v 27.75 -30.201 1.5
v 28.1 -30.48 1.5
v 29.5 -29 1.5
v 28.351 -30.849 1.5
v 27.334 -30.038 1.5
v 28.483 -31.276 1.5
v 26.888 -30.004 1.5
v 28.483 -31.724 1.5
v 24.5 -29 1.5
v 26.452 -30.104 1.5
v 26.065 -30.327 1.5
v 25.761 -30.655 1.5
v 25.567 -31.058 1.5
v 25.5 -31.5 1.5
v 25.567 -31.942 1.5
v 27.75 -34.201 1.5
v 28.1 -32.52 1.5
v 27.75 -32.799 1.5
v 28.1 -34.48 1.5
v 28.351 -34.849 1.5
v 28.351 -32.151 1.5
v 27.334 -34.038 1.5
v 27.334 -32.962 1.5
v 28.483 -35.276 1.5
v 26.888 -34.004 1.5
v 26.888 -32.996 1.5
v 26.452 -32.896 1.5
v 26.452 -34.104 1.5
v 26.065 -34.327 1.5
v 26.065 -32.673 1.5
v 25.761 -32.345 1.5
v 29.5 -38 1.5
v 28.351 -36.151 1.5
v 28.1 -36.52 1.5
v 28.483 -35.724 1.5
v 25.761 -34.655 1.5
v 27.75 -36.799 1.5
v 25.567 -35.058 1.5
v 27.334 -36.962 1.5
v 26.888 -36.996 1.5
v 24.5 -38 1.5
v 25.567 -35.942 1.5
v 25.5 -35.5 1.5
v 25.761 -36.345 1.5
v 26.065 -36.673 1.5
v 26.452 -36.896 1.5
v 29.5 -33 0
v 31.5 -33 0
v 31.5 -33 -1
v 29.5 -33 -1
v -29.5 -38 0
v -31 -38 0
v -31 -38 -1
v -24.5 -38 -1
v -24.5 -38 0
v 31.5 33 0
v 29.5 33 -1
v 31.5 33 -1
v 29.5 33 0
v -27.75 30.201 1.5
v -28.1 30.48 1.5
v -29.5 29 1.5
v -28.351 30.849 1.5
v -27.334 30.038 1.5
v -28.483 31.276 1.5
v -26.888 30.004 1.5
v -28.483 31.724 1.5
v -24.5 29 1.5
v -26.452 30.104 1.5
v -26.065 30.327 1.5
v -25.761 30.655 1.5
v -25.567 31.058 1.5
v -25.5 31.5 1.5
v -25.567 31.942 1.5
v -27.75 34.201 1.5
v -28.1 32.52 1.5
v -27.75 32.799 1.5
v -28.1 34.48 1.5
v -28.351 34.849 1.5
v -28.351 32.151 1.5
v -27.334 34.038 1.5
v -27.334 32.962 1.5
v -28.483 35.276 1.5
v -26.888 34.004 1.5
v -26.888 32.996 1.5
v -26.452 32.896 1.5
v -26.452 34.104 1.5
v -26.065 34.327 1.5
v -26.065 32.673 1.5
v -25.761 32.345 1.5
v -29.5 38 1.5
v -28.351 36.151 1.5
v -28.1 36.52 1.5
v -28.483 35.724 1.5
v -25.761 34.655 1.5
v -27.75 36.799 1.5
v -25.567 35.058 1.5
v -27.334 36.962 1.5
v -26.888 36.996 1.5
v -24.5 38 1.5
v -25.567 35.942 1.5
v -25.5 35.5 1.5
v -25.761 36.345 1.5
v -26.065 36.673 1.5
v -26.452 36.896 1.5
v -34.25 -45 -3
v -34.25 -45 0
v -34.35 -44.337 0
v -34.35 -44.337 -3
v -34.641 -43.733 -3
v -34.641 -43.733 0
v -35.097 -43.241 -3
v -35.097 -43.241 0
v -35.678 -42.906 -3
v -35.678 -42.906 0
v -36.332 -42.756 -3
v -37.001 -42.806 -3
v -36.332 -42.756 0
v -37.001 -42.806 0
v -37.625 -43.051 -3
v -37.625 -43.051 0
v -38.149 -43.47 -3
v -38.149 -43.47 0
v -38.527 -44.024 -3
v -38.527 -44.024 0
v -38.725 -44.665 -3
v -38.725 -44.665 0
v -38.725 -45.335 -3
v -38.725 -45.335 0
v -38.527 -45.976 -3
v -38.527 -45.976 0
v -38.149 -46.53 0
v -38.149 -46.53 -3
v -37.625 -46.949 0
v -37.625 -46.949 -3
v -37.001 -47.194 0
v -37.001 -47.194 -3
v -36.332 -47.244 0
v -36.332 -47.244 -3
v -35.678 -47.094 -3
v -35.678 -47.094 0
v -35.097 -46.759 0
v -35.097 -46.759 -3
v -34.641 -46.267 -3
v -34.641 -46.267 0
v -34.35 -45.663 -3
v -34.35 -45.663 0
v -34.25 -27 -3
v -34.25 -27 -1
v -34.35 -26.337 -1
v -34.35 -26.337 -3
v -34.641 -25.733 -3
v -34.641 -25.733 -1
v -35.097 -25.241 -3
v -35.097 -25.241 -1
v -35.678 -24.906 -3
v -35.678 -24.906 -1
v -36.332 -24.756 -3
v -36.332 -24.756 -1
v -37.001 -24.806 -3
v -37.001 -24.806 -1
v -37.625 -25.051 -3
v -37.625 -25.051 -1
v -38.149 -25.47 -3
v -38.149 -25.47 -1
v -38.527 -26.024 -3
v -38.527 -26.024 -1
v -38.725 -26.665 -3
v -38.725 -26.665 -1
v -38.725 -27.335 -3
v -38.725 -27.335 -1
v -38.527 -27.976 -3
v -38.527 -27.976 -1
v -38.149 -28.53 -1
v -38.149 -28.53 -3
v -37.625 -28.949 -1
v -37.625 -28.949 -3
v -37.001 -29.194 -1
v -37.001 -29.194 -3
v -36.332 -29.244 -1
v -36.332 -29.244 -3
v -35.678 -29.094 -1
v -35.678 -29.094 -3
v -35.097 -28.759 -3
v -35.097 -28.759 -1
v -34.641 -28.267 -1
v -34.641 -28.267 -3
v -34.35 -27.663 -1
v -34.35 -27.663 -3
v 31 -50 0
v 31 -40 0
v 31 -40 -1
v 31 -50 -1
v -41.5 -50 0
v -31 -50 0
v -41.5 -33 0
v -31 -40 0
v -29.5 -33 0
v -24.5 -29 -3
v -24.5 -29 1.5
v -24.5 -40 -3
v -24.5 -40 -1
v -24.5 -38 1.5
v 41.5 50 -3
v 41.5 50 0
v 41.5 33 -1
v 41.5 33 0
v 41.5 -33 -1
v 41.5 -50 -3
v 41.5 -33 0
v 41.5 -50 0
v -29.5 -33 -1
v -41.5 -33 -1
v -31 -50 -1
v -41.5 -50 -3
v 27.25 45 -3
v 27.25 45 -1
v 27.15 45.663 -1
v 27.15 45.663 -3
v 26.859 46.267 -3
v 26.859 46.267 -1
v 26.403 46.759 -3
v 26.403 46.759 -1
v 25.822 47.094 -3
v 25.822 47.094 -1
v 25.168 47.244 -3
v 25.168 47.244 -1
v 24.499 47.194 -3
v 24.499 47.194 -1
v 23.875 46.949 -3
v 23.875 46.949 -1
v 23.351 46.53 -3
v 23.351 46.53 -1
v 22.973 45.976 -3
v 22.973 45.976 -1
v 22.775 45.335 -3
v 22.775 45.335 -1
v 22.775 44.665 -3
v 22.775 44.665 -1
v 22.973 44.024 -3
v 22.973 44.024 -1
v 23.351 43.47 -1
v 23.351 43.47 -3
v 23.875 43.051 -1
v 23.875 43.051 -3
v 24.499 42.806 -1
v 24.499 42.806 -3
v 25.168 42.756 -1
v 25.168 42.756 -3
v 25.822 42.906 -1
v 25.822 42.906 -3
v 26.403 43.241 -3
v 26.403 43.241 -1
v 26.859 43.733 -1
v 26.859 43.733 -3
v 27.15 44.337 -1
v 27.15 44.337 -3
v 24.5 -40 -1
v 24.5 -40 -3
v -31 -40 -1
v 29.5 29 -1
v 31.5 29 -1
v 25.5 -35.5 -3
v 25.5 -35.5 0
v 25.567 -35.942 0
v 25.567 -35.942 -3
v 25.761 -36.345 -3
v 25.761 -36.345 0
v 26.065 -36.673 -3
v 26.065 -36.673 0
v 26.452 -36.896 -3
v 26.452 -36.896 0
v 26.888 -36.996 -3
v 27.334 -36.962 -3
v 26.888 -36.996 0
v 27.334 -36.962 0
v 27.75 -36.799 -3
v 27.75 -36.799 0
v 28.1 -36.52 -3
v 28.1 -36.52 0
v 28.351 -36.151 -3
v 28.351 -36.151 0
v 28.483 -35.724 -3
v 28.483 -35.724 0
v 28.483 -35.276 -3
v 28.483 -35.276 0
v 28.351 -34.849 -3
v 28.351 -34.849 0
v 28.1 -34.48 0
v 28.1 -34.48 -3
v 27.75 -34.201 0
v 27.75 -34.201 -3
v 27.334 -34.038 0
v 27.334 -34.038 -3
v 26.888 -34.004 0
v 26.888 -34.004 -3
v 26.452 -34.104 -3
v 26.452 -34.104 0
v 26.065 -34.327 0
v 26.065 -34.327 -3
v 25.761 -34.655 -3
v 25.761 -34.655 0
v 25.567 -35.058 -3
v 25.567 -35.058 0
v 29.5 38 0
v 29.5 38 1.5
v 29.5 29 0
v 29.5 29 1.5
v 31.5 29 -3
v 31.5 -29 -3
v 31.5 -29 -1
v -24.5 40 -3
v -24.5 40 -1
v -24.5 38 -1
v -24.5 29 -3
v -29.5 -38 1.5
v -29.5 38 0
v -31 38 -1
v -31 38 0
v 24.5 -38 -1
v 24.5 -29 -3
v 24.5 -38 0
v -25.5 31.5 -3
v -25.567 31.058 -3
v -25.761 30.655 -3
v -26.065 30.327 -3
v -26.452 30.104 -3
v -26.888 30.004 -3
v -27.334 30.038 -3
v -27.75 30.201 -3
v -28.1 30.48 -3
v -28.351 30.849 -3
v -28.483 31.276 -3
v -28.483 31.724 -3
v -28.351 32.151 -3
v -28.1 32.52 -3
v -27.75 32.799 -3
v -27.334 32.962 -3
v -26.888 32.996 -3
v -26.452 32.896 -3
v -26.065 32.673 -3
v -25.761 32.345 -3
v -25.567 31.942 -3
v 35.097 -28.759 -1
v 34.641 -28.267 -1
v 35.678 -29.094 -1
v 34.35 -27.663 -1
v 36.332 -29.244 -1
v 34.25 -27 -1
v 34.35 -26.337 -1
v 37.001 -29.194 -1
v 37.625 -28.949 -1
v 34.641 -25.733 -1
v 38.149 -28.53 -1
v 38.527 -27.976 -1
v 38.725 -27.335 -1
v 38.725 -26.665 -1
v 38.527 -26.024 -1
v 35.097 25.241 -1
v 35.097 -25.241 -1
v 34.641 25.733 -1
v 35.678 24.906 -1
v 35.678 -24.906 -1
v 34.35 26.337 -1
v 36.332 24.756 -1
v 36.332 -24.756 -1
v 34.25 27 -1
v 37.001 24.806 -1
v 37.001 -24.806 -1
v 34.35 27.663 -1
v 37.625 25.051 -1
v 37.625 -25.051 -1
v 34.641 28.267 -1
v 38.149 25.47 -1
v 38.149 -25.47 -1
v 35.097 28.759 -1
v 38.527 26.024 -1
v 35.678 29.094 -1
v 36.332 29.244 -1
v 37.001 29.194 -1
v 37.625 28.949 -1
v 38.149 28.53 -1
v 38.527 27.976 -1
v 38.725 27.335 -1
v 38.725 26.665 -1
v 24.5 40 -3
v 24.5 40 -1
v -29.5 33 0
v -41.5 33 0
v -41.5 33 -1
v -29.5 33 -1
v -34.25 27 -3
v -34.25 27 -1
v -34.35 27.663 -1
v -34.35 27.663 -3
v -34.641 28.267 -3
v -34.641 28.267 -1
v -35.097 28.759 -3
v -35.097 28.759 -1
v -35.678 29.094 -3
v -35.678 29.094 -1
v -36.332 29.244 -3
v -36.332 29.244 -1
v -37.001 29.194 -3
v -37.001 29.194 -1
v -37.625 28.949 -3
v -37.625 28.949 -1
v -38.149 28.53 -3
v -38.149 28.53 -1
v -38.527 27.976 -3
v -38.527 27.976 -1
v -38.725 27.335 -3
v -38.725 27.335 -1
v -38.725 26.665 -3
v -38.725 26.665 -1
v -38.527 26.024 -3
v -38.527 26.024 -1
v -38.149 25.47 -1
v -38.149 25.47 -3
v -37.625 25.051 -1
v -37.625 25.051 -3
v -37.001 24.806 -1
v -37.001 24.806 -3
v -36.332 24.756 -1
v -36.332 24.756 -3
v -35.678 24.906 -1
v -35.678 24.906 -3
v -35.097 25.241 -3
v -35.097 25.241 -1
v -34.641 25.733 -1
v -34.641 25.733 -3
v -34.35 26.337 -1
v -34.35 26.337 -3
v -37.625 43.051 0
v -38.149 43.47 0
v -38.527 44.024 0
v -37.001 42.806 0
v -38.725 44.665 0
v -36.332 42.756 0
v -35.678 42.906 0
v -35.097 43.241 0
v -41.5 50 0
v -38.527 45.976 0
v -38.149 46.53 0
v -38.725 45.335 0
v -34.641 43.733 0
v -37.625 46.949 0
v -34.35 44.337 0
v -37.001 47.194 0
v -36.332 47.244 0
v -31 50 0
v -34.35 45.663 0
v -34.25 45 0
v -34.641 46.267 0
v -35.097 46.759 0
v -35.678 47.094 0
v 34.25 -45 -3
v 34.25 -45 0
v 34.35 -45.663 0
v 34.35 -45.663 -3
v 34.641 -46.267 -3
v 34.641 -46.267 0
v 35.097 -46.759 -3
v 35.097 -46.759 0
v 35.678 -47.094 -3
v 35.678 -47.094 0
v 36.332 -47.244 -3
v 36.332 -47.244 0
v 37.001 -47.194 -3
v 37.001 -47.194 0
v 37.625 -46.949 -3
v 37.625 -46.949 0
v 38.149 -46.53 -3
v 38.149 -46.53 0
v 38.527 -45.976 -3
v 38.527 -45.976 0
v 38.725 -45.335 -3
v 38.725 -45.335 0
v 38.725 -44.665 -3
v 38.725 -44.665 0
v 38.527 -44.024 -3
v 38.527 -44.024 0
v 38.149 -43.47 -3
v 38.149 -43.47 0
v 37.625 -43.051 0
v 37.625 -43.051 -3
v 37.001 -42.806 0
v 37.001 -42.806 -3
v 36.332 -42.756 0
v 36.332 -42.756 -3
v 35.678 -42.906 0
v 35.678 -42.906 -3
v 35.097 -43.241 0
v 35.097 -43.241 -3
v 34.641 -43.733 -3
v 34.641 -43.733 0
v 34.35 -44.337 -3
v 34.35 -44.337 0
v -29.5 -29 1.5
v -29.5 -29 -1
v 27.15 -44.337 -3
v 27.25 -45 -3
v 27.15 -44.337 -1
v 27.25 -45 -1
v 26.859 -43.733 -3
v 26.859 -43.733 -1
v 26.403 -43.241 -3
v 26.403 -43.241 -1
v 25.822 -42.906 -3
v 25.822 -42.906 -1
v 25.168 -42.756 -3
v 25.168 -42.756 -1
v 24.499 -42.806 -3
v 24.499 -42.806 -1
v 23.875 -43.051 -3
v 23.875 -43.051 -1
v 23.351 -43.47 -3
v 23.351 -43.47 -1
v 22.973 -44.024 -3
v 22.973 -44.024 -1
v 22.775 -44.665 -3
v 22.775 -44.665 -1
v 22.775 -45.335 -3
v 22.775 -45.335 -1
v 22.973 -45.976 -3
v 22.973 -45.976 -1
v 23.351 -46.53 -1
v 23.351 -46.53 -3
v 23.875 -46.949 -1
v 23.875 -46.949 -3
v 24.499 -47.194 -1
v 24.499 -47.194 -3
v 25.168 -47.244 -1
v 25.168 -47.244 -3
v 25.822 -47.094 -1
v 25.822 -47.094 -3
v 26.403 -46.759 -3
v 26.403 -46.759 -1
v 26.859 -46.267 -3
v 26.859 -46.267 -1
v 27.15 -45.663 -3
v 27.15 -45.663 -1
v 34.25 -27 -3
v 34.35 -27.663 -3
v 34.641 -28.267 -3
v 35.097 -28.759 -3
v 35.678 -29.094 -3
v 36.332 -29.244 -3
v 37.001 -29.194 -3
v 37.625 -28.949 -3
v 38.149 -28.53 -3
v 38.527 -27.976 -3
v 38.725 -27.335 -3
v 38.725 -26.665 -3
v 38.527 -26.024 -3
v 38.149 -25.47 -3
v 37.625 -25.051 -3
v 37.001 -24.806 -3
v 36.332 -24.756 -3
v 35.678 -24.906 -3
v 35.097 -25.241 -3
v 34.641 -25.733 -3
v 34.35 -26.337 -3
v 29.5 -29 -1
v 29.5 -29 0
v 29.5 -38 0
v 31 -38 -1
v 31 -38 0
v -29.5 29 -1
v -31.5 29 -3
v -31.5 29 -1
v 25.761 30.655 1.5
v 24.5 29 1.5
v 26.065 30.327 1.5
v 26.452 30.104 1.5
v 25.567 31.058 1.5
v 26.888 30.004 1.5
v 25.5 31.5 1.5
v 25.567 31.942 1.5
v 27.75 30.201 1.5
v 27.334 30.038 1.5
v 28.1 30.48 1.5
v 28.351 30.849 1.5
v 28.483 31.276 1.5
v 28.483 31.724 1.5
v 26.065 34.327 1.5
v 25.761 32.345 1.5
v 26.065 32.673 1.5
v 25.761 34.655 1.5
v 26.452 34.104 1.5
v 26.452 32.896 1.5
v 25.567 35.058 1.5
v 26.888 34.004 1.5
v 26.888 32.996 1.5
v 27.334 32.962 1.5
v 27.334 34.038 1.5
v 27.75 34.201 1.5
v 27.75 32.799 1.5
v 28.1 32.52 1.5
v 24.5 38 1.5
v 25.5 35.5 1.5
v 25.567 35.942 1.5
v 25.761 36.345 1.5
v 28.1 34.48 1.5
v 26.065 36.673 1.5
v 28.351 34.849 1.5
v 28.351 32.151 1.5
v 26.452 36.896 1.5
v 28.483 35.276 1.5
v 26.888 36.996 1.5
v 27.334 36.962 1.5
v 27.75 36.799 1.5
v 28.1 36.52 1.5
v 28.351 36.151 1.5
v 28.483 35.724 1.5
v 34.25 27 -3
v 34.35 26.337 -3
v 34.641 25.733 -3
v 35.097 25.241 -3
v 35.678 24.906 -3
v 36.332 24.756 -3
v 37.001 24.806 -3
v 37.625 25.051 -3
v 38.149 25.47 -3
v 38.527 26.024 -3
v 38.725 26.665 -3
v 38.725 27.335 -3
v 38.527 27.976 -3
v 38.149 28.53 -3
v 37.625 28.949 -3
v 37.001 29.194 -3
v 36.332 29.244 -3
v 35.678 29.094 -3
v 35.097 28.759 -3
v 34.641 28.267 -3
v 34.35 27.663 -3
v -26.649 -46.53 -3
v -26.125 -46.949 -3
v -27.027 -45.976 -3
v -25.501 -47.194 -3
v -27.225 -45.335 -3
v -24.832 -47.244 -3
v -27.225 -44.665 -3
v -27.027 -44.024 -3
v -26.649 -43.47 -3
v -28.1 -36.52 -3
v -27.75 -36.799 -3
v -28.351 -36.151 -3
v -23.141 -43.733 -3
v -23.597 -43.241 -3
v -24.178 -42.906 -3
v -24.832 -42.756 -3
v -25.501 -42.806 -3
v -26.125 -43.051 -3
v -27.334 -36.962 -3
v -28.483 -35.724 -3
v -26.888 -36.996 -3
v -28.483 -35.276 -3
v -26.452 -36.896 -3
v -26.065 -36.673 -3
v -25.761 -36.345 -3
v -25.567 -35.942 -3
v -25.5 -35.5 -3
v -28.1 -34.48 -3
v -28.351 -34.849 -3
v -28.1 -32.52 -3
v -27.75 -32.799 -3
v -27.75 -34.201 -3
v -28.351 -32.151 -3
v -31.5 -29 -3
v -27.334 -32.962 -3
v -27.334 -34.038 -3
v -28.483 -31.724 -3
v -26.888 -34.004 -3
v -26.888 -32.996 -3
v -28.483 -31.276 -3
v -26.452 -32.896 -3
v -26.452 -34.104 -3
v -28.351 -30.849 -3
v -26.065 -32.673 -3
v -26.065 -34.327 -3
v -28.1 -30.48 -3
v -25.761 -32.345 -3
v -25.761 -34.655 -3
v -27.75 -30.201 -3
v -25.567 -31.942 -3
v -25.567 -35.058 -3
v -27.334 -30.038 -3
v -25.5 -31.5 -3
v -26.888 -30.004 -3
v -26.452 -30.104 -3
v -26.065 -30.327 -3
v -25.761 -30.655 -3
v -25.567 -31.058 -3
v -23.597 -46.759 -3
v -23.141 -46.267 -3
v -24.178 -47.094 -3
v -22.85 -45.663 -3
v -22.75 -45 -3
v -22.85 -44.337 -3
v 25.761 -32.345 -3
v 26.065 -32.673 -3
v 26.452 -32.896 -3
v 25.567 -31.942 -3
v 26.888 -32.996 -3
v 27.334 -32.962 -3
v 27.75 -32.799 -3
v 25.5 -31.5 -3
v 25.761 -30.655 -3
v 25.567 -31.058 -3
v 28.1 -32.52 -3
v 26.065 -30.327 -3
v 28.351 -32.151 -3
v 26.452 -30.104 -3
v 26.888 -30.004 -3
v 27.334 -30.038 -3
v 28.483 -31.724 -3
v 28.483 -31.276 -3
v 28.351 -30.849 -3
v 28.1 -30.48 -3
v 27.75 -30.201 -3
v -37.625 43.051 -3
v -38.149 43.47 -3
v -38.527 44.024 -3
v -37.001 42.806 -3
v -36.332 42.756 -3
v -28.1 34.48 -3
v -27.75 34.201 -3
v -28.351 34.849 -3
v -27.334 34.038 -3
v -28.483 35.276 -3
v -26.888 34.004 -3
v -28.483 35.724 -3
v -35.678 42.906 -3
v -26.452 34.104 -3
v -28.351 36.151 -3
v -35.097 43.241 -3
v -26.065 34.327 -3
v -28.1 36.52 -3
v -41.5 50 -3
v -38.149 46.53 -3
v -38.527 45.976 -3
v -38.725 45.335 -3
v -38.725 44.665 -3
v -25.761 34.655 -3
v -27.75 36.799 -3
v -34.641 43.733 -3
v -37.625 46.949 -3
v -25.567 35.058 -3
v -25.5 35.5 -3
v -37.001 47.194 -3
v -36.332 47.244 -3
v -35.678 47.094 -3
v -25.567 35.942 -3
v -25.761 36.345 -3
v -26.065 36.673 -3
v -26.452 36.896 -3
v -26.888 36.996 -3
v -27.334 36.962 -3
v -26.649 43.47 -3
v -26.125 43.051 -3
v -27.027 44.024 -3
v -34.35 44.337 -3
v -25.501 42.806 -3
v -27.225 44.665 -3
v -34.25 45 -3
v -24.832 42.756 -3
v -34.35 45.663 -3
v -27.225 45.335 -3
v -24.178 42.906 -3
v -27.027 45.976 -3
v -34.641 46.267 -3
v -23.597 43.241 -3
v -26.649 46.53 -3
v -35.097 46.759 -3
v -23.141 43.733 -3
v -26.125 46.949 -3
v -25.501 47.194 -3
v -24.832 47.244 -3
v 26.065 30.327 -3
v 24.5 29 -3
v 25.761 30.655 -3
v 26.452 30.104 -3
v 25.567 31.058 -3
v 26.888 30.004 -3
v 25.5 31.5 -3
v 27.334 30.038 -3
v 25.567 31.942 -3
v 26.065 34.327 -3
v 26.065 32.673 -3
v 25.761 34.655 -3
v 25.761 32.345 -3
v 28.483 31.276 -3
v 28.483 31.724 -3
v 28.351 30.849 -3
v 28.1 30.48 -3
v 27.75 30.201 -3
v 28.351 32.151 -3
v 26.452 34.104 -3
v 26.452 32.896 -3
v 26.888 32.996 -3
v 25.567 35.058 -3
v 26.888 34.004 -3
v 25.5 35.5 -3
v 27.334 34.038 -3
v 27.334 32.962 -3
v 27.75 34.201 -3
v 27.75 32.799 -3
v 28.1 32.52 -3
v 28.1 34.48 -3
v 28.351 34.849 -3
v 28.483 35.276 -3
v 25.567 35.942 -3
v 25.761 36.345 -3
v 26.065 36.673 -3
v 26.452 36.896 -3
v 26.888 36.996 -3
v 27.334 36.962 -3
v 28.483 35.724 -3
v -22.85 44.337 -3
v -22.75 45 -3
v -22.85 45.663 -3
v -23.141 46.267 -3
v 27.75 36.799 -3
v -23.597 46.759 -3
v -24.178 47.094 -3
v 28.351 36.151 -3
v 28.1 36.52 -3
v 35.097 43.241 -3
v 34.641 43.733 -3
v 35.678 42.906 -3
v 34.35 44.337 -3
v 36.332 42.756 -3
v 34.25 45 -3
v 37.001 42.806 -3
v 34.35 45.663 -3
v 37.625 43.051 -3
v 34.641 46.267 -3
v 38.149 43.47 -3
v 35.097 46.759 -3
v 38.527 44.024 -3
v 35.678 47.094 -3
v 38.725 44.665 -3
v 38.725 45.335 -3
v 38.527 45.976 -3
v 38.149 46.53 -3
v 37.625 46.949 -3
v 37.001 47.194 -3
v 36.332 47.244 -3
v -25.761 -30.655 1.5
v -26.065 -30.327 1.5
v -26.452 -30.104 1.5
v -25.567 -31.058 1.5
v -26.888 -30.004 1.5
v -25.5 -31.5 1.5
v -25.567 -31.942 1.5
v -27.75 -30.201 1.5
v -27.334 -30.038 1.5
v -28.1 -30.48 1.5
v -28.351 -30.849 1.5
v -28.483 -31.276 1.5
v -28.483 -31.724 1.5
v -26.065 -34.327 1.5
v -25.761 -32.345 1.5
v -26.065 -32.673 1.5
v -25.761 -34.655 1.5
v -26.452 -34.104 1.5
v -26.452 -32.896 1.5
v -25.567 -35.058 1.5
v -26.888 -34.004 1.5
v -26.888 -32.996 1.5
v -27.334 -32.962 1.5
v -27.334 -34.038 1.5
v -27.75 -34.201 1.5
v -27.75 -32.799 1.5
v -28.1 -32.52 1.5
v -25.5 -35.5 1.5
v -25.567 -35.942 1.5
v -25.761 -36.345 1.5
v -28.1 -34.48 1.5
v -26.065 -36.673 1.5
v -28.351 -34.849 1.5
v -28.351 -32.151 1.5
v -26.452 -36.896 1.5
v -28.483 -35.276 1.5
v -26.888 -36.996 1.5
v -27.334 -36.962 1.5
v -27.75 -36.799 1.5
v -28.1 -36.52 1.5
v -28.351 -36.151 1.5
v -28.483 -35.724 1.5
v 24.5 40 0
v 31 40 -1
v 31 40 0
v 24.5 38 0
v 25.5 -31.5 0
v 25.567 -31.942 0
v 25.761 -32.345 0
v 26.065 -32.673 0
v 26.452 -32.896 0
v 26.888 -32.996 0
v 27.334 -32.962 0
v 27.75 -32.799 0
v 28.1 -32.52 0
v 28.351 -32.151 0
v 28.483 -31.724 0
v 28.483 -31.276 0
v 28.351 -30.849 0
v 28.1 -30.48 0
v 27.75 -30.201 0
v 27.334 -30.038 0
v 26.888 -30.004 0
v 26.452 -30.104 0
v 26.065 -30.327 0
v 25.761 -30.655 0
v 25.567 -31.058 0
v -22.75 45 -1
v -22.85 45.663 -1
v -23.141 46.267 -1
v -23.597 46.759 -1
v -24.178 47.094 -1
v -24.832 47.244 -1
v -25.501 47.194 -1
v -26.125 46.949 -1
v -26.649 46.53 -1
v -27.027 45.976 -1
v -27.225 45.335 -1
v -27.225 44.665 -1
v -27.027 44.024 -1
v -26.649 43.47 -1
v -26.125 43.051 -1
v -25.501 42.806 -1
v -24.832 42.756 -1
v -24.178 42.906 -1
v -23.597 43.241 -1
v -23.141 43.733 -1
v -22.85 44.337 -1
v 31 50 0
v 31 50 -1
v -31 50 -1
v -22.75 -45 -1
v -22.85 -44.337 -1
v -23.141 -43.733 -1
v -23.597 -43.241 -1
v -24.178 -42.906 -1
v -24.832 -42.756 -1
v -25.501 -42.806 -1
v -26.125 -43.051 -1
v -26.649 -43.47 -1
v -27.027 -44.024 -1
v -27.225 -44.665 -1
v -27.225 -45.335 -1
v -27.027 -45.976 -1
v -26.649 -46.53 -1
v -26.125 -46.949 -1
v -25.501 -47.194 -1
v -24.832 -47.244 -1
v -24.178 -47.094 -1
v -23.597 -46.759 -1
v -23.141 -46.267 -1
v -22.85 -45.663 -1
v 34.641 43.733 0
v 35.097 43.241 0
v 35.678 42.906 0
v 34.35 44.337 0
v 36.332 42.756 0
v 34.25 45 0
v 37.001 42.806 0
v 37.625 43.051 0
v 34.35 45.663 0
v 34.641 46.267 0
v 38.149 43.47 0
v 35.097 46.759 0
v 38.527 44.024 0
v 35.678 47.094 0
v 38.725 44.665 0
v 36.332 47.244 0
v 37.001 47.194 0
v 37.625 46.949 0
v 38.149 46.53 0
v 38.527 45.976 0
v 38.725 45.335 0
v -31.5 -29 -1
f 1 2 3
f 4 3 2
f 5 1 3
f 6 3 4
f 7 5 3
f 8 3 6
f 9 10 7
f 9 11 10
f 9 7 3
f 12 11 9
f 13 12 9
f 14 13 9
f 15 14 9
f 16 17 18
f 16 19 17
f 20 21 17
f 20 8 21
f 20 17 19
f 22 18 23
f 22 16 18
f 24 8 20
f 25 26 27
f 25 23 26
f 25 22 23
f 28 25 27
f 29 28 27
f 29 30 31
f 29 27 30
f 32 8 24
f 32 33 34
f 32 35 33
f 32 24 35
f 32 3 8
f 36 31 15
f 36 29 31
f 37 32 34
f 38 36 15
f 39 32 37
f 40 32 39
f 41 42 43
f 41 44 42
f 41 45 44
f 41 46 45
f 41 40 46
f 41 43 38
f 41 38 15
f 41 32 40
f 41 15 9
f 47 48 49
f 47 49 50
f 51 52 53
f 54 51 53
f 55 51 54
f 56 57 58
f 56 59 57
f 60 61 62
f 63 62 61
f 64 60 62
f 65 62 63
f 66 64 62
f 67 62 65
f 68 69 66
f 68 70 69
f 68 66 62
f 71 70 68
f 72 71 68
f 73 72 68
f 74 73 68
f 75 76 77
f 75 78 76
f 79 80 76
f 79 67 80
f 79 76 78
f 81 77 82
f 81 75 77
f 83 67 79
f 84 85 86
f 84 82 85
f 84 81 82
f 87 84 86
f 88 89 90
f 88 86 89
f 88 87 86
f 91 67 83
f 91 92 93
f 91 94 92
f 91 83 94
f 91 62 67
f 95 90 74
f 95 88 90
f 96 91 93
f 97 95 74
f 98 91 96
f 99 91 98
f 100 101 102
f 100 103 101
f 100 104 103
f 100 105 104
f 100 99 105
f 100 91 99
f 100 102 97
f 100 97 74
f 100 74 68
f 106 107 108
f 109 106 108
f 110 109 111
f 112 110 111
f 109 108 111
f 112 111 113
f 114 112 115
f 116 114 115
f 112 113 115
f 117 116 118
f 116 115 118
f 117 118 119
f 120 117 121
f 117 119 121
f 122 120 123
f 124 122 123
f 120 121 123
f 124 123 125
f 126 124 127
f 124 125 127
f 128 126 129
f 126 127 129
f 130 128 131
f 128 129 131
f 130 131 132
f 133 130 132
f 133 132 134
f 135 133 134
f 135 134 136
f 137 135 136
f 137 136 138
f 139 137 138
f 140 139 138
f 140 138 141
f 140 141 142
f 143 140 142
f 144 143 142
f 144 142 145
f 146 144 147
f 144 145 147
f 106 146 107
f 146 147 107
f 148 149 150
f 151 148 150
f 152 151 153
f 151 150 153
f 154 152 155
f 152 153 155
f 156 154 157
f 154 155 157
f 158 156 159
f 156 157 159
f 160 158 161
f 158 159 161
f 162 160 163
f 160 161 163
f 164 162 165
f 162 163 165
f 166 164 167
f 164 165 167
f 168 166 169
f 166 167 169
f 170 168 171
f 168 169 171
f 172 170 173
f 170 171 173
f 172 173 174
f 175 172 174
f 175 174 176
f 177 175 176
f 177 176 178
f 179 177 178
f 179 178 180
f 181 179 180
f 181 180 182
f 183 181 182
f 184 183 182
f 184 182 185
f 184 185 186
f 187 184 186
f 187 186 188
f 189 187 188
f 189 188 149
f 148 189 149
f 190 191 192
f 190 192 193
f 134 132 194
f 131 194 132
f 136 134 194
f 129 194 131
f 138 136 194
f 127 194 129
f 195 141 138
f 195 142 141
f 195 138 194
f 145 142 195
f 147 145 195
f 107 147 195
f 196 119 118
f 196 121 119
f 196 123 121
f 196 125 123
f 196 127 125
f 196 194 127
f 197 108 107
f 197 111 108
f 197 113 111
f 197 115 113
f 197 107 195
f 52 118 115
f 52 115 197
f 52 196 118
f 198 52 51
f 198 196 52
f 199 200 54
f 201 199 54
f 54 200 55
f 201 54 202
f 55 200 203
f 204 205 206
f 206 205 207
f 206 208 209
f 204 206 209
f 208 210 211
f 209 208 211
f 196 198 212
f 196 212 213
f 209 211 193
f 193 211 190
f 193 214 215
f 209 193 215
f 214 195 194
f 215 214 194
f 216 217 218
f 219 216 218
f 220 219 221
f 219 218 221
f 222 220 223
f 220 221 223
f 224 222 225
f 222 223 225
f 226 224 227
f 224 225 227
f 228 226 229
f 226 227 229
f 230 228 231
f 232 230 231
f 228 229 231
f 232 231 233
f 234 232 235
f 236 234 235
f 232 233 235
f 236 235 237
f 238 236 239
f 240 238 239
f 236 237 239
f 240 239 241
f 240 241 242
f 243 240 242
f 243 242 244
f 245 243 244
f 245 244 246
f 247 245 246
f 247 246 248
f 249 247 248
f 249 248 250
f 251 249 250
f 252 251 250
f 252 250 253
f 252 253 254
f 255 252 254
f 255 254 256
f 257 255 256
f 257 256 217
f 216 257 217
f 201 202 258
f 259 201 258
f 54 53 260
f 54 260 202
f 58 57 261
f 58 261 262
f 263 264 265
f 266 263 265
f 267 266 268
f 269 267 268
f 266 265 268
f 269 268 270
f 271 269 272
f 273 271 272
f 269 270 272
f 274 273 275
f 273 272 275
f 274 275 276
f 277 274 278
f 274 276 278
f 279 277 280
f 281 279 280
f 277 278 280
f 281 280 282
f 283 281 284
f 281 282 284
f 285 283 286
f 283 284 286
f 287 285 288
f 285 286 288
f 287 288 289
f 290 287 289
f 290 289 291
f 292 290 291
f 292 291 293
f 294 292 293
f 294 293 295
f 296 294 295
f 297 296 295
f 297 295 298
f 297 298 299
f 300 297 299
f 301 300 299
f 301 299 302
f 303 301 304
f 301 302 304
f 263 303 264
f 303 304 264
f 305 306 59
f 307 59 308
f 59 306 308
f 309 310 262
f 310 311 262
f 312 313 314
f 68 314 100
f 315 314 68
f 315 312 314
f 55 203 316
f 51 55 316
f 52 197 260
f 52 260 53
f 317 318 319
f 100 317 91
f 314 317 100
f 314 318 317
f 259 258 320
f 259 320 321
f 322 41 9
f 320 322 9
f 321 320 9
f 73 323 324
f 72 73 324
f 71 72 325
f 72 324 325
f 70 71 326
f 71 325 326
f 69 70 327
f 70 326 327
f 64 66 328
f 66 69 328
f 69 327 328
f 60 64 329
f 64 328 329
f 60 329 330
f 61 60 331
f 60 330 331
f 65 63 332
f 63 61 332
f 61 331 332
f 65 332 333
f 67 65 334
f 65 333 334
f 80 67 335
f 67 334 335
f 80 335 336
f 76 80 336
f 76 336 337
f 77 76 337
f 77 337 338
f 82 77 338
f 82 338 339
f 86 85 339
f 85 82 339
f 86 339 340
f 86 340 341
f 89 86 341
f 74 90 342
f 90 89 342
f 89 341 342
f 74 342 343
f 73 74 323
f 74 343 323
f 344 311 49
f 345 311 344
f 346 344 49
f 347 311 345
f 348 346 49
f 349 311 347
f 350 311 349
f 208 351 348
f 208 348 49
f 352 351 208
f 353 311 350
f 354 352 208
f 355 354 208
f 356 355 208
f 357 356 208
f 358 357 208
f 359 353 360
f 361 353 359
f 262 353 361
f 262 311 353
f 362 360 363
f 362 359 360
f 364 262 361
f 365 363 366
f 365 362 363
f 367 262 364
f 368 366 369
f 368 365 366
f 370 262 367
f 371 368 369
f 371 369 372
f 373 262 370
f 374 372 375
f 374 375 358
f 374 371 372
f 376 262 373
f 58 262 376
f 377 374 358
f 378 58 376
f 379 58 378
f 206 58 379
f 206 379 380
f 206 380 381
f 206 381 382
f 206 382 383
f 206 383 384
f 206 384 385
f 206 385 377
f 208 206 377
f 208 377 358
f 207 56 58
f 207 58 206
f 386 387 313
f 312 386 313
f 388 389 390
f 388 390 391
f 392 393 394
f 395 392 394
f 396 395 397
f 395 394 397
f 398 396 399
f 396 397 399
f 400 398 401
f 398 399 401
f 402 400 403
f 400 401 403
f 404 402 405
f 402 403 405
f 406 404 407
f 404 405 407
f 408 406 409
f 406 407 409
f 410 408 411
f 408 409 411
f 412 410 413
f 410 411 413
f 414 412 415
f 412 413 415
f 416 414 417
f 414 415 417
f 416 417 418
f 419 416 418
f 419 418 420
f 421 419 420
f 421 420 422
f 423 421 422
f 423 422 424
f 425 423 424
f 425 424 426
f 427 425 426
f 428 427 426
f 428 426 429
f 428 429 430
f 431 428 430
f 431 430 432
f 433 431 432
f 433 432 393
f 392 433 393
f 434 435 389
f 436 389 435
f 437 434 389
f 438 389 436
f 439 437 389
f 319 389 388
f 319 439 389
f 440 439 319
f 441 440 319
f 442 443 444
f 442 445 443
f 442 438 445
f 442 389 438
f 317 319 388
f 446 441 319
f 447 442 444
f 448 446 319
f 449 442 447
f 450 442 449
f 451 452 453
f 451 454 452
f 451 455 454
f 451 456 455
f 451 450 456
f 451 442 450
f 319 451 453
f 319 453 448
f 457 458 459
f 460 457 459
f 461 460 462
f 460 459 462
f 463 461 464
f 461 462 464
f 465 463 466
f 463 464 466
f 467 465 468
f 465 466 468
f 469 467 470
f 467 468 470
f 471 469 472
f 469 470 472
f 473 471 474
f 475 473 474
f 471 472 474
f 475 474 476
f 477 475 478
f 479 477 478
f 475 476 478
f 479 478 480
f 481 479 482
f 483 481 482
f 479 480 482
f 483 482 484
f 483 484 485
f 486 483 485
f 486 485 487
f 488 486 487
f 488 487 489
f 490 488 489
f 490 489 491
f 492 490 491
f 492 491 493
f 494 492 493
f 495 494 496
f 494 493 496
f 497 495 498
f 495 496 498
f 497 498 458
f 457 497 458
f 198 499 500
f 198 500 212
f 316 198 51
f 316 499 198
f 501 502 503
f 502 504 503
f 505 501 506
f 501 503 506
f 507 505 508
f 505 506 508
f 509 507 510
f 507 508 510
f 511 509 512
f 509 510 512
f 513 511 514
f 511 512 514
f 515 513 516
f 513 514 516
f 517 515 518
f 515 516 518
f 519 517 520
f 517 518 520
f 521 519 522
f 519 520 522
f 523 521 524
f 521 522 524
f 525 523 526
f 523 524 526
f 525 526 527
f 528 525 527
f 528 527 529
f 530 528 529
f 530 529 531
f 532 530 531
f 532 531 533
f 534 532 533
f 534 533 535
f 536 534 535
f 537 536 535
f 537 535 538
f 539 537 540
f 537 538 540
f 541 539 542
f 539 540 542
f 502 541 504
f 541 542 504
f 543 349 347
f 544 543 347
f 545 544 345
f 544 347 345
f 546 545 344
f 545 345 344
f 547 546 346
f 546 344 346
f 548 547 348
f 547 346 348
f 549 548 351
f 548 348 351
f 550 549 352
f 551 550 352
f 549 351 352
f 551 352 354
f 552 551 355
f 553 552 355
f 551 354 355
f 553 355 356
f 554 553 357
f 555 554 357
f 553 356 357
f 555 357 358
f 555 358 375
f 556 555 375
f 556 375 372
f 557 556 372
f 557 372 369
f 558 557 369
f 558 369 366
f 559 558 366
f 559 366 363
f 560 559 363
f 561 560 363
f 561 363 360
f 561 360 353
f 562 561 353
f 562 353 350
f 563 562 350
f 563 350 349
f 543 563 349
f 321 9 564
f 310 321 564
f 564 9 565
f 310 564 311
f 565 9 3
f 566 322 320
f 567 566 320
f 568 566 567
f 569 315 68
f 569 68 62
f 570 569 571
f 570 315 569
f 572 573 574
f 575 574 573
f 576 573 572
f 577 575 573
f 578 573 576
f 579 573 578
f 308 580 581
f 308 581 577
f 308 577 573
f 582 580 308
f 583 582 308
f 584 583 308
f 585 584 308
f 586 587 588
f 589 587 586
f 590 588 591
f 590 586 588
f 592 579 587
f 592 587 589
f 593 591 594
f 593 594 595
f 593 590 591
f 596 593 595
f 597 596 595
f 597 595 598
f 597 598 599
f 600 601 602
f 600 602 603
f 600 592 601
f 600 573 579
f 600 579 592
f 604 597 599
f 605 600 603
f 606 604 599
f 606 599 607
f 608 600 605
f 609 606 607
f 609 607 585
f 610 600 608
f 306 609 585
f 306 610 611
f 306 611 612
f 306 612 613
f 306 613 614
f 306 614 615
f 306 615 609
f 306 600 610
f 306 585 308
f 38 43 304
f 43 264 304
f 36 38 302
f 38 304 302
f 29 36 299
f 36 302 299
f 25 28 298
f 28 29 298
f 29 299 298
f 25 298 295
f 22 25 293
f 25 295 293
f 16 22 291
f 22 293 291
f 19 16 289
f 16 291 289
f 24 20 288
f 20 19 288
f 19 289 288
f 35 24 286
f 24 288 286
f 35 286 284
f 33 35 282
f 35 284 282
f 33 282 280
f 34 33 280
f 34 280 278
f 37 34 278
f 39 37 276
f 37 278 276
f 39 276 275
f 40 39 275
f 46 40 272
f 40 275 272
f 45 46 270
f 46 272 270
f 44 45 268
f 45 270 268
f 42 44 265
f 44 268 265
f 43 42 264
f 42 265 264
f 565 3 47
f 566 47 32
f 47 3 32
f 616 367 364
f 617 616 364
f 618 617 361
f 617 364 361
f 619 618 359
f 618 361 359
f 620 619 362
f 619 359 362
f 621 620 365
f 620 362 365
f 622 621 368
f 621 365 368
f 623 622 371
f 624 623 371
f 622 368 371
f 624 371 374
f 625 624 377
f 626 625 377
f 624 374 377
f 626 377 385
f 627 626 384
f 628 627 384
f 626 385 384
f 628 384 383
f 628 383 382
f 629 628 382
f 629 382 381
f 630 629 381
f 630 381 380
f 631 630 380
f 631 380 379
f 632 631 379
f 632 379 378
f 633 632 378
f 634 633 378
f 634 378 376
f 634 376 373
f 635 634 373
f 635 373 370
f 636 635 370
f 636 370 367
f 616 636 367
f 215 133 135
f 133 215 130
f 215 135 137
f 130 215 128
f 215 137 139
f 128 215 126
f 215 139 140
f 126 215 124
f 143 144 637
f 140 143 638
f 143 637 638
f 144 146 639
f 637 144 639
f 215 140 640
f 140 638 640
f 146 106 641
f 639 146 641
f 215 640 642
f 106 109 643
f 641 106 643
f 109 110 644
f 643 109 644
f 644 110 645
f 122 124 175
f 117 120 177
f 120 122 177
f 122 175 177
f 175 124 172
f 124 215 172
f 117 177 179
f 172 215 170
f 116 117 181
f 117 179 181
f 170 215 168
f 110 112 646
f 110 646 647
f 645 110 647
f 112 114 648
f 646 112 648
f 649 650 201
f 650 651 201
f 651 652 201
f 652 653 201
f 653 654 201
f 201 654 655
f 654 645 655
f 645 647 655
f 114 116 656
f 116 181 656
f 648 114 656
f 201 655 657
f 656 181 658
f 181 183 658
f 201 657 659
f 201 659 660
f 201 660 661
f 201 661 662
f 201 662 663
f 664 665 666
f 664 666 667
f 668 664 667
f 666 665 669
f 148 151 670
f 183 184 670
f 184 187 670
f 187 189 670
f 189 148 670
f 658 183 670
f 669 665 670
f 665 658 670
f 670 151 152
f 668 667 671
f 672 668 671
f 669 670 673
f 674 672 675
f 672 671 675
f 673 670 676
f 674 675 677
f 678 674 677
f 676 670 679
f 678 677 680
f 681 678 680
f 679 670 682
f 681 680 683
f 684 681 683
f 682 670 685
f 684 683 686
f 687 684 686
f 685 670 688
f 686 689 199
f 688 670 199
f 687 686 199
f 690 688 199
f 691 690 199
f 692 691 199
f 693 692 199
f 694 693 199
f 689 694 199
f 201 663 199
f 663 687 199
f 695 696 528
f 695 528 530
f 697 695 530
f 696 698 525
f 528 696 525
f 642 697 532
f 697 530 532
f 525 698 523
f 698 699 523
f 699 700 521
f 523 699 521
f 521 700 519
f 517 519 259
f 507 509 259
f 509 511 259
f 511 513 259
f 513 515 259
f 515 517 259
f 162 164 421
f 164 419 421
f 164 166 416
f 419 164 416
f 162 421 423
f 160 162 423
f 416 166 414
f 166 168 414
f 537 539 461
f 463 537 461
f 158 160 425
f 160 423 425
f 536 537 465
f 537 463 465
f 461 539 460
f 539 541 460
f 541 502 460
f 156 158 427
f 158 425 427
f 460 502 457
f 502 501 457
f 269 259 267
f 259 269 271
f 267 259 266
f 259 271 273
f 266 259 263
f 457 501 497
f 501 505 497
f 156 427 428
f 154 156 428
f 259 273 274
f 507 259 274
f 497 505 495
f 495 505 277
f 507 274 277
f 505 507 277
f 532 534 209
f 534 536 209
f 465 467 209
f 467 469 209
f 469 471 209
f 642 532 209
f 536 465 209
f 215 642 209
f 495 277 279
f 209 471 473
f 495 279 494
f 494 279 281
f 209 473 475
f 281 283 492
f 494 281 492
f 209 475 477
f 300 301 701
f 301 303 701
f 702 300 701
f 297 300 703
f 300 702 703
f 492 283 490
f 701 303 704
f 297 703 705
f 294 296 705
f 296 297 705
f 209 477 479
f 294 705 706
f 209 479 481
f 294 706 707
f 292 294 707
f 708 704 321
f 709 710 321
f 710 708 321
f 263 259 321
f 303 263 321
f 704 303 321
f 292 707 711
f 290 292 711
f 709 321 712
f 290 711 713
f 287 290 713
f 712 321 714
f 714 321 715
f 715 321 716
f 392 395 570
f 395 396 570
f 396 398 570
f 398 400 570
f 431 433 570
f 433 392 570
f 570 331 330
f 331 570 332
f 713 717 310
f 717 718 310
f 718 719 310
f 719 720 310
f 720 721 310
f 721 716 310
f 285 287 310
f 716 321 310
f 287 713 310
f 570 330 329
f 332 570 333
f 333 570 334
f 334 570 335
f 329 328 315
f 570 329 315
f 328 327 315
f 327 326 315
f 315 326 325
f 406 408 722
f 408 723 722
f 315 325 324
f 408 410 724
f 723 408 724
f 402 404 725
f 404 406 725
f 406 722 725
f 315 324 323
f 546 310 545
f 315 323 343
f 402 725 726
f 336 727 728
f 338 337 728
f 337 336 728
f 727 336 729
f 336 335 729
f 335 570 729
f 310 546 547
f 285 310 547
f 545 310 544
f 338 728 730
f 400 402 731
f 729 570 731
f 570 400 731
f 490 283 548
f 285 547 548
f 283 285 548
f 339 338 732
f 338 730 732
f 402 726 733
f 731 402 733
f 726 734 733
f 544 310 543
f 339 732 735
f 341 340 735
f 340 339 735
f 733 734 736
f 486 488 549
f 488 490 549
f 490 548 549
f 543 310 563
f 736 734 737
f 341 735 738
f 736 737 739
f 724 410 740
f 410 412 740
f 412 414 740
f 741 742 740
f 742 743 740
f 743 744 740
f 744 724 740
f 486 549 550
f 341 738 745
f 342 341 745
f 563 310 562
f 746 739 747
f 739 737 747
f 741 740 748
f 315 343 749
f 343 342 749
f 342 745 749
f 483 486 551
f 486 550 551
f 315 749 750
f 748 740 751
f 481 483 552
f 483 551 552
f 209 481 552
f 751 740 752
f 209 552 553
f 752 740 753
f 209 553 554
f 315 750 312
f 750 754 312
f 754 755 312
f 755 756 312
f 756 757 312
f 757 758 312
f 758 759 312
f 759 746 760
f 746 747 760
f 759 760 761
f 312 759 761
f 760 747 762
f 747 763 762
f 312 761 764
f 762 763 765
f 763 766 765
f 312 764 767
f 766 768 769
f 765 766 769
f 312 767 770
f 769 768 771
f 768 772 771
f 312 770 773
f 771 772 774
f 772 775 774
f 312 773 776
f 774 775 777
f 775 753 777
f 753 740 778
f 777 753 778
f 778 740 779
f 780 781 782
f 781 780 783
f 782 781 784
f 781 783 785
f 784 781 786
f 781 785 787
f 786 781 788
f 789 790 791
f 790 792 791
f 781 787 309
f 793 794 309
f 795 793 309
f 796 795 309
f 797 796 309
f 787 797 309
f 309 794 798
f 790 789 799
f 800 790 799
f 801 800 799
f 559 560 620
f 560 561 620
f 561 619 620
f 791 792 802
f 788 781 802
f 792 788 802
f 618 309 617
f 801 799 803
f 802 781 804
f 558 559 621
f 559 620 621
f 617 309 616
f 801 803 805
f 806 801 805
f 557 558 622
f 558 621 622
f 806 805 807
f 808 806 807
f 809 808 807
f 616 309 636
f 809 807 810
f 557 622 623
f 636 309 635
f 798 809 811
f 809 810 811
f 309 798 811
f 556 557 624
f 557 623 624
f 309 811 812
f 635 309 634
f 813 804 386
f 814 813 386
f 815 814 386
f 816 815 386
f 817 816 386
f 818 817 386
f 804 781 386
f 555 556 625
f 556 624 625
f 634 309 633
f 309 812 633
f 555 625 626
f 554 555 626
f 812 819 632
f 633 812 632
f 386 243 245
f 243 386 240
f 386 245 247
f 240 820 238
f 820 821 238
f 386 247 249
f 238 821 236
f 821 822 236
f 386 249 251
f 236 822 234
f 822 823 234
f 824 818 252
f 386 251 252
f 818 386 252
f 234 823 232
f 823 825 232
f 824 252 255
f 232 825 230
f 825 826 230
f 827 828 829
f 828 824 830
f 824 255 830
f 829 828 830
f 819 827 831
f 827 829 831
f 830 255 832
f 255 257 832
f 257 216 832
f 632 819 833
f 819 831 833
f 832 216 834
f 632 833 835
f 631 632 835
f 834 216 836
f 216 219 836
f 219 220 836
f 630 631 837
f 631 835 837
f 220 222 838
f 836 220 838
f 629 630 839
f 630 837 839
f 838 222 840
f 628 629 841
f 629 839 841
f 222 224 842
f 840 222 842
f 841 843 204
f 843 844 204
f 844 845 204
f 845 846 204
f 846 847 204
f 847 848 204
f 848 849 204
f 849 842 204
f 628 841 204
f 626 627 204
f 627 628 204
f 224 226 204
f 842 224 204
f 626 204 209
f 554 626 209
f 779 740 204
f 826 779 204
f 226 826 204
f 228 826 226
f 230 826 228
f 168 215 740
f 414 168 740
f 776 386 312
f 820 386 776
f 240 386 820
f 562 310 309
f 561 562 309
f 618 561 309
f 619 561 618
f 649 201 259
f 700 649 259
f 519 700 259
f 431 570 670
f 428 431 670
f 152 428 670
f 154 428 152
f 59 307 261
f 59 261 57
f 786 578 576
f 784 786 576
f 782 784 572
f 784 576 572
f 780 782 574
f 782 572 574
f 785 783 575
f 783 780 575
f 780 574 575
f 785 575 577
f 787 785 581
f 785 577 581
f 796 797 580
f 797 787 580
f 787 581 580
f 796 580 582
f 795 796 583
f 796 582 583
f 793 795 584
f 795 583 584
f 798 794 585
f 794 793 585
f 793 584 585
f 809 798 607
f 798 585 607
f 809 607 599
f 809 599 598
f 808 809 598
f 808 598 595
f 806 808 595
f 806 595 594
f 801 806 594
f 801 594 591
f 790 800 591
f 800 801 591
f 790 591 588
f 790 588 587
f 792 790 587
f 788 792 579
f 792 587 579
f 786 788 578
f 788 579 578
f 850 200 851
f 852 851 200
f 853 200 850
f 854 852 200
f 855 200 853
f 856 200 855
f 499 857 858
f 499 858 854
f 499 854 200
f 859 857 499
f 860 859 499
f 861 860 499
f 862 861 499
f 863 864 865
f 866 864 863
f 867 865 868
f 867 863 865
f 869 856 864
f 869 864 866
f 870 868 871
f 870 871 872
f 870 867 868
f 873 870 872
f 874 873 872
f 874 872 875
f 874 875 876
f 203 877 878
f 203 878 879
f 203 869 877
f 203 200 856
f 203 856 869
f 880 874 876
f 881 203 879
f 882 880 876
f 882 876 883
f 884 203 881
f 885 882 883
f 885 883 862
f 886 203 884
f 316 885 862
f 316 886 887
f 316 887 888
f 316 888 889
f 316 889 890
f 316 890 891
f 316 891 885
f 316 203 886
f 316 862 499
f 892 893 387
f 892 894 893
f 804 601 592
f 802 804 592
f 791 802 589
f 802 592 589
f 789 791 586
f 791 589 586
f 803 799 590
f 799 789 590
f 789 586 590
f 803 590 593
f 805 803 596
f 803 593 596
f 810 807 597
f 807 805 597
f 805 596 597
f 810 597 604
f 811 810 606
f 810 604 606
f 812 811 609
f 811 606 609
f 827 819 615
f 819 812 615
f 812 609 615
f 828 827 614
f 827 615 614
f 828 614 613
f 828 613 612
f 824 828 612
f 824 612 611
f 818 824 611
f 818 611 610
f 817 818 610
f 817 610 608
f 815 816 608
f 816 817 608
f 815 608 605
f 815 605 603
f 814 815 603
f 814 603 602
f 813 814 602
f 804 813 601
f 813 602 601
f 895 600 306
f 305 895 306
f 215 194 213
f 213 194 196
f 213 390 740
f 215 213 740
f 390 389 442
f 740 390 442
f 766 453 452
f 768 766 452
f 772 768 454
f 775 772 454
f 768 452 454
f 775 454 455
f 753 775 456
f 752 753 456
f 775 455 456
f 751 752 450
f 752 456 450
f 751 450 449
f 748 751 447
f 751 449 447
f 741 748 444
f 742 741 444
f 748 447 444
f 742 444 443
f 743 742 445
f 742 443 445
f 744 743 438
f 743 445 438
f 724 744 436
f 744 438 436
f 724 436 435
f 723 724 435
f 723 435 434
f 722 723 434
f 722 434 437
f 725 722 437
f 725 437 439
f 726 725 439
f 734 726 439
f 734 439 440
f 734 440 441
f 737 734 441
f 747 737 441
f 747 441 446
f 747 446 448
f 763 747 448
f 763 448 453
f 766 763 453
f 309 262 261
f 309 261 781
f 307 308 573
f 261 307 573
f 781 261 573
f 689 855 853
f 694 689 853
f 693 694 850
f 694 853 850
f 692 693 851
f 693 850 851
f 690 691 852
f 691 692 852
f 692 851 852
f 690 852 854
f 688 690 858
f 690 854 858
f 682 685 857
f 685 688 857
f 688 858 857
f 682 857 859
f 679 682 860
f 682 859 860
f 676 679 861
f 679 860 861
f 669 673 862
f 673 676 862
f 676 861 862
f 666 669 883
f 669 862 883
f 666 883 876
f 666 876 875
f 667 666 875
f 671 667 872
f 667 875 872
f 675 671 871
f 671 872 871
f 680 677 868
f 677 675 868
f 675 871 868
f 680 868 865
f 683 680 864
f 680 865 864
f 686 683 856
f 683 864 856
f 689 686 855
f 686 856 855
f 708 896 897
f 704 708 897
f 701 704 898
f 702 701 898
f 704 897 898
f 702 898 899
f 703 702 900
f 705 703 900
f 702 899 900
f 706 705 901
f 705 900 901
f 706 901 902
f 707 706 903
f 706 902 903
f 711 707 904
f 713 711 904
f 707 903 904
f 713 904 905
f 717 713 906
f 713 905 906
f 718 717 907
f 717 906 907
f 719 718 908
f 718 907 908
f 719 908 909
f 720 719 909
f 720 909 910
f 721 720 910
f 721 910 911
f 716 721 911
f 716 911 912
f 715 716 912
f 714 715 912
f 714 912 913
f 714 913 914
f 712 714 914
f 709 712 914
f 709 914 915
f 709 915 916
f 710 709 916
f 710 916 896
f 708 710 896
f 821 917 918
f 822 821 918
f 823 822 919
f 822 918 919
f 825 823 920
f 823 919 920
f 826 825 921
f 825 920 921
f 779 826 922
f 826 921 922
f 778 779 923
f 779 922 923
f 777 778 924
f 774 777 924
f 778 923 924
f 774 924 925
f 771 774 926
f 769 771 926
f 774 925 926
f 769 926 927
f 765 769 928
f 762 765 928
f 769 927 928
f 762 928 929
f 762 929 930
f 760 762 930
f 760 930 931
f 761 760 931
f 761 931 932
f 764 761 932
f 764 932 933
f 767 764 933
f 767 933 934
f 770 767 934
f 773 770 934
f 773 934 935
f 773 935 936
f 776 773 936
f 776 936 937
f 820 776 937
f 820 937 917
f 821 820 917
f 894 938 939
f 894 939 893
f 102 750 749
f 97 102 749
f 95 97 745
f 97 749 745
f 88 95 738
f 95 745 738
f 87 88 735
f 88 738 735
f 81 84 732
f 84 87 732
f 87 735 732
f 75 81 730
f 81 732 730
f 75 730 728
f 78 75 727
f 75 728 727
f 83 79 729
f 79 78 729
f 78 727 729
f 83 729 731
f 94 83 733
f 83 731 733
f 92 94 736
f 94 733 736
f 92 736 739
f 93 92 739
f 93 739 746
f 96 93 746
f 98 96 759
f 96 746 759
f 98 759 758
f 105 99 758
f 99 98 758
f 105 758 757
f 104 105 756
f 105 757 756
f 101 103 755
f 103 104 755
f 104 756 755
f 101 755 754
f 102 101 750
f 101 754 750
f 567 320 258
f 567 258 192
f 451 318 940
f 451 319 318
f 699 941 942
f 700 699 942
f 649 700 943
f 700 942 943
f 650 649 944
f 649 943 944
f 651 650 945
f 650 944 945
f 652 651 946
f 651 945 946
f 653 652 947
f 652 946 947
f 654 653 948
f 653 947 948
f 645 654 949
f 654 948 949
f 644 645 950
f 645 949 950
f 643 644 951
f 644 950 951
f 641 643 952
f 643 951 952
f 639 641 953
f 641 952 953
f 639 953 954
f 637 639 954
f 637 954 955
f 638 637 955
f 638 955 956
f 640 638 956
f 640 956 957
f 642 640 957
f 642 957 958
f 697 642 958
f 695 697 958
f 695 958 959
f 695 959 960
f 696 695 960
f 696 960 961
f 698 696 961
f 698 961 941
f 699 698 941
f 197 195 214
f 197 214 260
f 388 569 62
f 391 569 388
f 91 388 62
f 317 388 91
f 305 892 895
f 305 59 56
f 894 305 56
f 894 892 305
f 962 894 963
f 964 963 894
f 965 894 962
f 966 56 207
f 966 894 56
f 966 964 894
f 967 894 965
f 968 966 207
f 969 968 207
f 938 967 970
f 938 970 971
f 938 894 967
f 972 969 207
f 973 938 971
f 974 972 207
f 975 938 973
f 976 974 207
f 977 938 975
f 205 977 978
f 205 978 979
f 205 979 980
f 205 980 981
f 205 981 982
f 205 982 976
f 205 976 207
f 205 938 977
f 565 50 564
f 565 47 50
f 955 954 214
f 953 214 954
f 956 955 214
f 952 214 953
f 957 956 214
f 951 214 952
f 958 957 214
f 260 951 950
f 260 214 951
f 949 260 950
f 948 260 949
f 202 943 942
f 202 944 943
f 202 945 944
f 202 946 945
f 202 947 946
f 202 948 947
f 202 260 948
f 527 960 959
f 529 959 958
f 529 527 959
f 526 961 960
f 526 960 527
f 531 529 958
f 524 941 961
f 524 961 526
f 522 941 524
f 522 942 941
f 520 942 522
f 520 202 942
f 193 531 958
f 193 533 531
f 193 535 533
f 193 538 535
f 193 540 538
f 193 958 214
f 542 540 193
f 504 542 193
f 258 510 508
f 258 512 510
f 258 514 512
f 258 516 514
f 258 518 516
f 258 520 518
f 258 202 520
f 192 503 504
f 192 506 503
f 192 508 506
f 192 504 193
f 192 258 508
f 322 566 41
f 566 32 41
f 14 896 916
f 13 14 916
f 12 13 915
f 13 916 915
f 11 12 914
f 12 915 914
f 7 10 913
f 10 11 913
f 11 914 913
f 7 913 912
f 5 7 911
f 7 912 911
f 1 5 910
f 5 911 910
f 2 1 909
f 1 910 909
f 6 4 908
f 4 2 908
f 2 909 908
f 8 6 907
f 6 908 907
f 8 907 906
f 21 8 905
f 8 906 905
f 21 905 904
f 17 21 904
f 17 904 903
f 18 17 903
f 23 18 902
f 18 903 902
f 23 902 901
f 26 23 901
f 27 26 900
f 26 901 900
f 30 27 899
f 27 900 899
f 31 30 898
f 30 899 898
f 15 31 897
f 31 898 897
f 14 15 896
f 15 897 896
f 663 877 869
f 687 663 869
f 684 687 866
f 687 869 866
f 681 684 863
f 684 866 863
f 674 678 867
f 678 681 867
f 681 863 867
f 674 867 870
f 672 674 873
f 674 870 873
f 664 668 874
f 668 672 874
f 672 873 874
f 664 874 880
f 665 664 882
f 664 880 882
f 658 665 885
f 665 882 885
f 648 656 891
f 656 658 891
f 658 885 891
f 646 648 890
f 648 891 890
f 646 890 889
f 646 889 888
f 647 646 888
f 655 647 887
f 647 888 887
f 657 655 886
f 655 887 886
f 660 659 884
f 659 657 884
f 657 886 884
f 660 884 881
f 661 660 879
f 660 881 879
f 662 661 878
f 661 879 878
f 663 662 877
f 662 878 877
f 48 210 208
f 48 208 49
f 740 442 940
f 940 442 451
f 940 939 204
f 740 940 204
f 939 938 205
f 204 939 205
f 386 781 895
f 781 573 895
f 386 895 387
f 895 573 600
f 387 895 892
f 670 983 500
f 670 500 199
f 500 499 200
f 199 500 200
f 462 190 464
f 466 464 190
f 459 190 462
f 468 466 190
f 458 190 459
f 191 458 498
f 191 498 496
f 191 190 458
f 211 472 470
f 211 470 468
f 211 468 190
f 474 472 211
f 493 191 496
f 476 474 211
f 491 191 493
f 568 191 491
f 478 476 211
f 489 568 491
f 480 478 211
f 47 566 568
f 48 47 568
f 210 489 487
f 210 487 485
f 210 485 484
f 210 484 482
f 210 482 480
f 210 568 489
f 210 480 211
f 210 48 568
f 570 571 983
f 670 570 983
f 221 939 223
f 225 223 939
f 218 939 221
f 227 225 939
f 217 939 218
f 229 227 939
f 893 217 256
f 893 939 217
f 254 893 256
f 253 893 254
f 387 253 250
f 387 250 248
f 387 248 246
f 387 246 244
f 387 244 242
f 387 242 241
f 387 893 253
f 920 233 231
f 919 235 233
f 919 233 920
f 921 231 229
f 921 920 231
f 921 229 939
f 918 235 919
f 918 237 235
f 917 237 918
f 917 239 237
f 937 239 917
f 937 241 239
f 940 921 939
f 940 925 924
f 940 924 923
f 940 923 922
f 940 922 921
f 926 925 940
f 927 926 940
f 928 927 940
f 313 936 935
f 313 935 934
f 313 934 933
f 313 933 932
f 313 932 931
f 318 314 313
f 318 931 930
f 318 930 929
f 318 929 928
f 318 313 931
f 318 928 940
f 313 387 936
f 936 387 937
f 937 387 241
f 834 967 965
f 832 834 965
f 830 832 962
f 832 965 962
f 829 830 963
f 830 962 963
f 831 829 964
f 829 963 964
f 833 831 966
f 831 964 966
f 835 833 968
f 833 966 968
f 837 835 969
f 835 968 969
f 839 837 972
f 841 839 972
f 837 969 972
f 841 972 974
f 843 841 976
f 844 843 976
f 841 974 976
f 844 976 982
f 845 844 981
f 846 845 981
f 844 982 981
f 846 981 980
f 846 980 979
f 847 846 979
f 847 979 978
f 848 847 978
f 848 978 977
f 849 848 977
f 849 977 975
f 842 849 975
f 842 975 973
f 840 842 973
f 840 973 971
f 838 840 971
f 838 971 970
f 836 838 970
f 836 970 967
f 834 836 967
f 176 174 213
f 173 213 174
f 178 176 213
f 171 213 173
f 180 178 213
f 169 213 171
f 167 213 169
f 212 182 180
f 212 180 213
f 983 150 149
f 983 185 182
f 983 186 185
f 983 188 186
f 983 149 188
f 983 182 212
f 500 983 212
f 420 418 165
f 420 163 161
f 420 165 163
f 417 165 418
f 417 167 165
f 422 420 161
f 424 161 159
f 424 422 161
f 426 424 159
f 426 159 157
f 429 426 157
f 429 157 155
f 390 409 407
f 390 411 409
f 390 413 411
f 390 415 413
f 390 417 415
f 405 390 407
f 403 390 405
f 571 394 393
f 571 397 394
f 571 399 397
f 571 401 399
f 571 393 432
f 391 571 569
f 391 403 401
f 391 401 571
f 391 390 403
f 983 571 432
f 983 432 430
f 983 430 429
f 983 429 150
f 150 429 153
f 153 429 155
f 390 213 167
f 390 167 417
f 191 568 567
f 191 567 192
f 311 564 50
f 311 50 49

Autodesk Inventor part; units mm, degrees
ref_plane "YZ Plane" through (0, 0, 0) normal (1, 0, 0) x (0, 1, 0)
ref_plane "XZ Plane" through (0, 0, 0) normal (0, 1, 0) x (-1, 0, 0)
ref_plane "XY Plane" through (0, 0, 0) normal (0, 0, 1) x (1, 0, 0)
sketch "Block1" plane through (0, 0, 0) normal (0, 0, 1) x (1, 0, 0)
  circle A0 centre (-3.2722, 18.9) radius 2.25
  circle A1 centre (-12.45, 7.7) radius 2.25
  circle A2 centre (-12.45, -4.3) radius 2.25
  line L0 (-6.45, -9) -> (-15.45, -9)
  line L1 (-6.45, -9) -> (-6.45, 12.4)
  line L2 (-6.45, 12.4) -> (2.9056, 12.4)
  line L3 (2.9056, 23.9) -> (-15.45, 23.9)
  line L4 (-15.45, -9) -> (-15.45, 23.9)
  line L5 (2.9056, 12.4) -> (2.9056, 23.9)
  line L6 (-6.45, 1.7) -> (-15.45, 1.7) construction
  point P0 (-7.0963, 8.6833)
  dimension "d131" = 6
  dimension "d132" = 6
sketch "Sketch1" plane through (0, 0, 0) normal (0, 0, 1) x (1, 0, 0)
  line L0 (-41.5, 50) -> (41.5, 50)
  line L1 (41.5, 50) -> (41.5, -50)
  line L2 (41.5, -50) -> (-41.5, -50)
  line L3 (-41.5, -50) -> (-41.5, 50)
  line L4 (31.5, 40) -> (-31.5, 40)
  line L5 (-31.5, 40) -> (-31.5, -40)
  line L6 (-31.5, -40) -> (31.5, -40)
  line L7 (31.5, -40) -> (31.5, 40)
  line L8 (-41.5, -45) -> (41.5, -45) construction
  line L9 (0, 71.7466) -> (0, -78.0681) construction
  line L10 (-60.2597, 0) -> (74.2823, 0) construction
  line L11 (-36.5, 50) -> (-36.5, -50) construction
  circle A0 centre (-36.5, -27) radius 2.25
  line L12 (-41.5, 45) -> (41.5, 45) construction
  circle A1 centre (-36.5, 45) radius 2.25
  circle A2 centre (-36.5, -45) radius 2.25
  circle A3 centre (-36.5, 27) radius 2.25
  circle A4 centre (-25, -45) radius 2.25
  circle A5 centre (25, -45) radius 2.25
  line L13 (30, 50) -> (30, -50) construction
  line L14 (-30, 50) -> (-30, -50) construction
  line L15 (-31, -38) -> (31, -38)
  line L16 (31, -38) -> (31, -52)
  line L17 (31, -52) -> (-31, -52)
  line L18 (-31, -52) -> (-31, -38)
  line L19 (-43.5, 33) -> (-29.5, 33)
  line L20 (-29.5, 33) -> (-29.5, -33)
  line L21 (-29.5, -33) -> (-43.5, -33)
  line L22 (-43.5, -33) -> (-43.5, 33)
  line L23 (-31.5, 40) -> (-24.5, 40)
  line L24 (-24.5, 40) -> (-24.5, 29)
  line L25 (-24.5, 29) -> (-31.5, 29)
  line L26 (-31.5, 29) -> (-31.5, 40)
  line L27 (-24.5, 29) -> (-29.5, 29)
  line L28 (-29.5, 29) -> (-29.5, 38)
  line L29 (-29.5, 38) -> (-24.5, 38)
  line L30 (-24.5, 38) -> (-24.5, 29)
  circle A6 centre (-27, 35.5) radius 1.5
  circle A7 centre (-27, 31.5) radius 1.5
  line L31 (22.2, -40) -> (-10.7, -40)
  point P0 (0, 0)
  point P1 (0, 50)
  point P2 (41.5, 0)
  point P3 (0, 45)
  point P4 (-27, 38)
  point P5 (-27, 29)
  dimension "d0" = 83
  dimension "d1" = 100
  dimension "d5" = 5
  dimension "d6" = 5
  dimension "d9" = 5
  dimension "d12" = 4.5
  dimension "d17" = 5
  dimension "d41" = 4.5
  dimension "d42" = 4.5
  dimension "d87" = 4.5
  dimension "d89" = 4.5
  dimension "d90" = 4.5
  dimension "d91" = 30
  dimension "d92" = 30
  dimension "d93" = 5
  dimension "d94" = 5
  dimension "d97" = 1
  dimension "d98" = 2
  dimension "d100" = 1
  dimension "d115" = 6
  dimension "d116" = 2
  dimension "d117" = 2
  dimension "d118" = 6
  dimension "d121" = 27
  dimension "d122" = 27
  dimension "d146" = 2
  dimension "d147" = 2
  dimension "d148" = 3
  dimension "d149" = 3
  dimension "d150" = 2.5
  dimension "d151" = 2.5
  dimension "d152" = 9
  dimension "d153" = 5
  dimension "d166" = 2
extrude "Extrusion1" add sketch "Sketch1" against normal blind 3 contours L0 L1 L2 L16 L6 L7 L4 L5 L19 L3 | L19 L5 L21 L3 | L21 L5 L6 L18 L2 L3 | L2 L18 L6 L16 | A0 | A1 | A2 | A3 | A4 | A5
extrude "Extrusion2" cut sketch "Sketch1" against normal blind 10 contours A0 | A1 | A2 | A3
mirror "Mirror1" about plane through (0, 0, 0) normal (1, 0, 0) of "Extrusion2"
extrude "Extrusion8" cut sketch "Sketch1" against normal blind 10 contours A4 | A5
extrude "Extrusion9" cut sketch "Sketch1" against normal blind 1 contours L16 L17 L18 L2 | L2 L18 L6 L16 | L6 L18 L15 L16
extrude "Extrusion14" add sketch "Sketch1" against normal blind 3 contours L19 L20 L25 L5 | L5 L4 L24 L29 L28 L19
extrude "Extrusion11" cut sketch "Sketch1" against normal blind 1 contours L19 L5 L21 L3 | L3 L21 L22 L19 | L19 L20 L25 L5 | L5 L25 L20 L21
mirror "Mirror4" about plane through (0, 0, 0) normal (0, 1, 0) of "Extrusion8", "Extrusion9"
mirror "Mirror5" about plane through (0, 0, 0) normal (1, 0, 0) of "Extrusion11"
extrude "Extrusion15" add sketch "Sketch1" against normal blind 3 contours L28 L29 L24 L25 L20
extrude "Extrusion16" add sketch "Sketch1" along normal blind 1.5 contours L28 L29 L24 L25 L20
mirror "Mirror6" about plane through (0, 0, 0) normal (1, 0, 0) of "Extrusion15", "Extrusion16", "Extrusion14"
mirror "Mirror7" about plane through (0, 0, 0) normal (0, 1, 0) of "Extrusion15", "Extrusion16", "Extrusion14", "Mirror6"
extrude "Extrusion18" cut sketch "Sketch1" against normal blind 1 contours L16 L17 L18 L2 | L2 L18 L6 L16 | L6 L18 L15 L16
extrude "Extrusion19" cut sketch "Sketch1" against normal blind 1 contours L19 L5 L21 L3 | L3 L21 L22 L19 | L19 L20 L25 L5 | L5 L25 L20 L21
mirror "Mirror8" about plane through (0, 0, 0) normal (1, 0, 0) of "Extrusion19"
equation "\"d12\" = screw"
equation "\"d41\" = screw"
equation "\"d42\" = screw"
equation "\"d87\" = screw"
equation "\"d89\" = screw"
equation "\"d90\" = screw"
equation "\"d37\" = mat"
equation "\"screw\" = 4.5"
equation "\"mat\" = 3"
properties part number "Side" material "PC/ABS Plastic"
